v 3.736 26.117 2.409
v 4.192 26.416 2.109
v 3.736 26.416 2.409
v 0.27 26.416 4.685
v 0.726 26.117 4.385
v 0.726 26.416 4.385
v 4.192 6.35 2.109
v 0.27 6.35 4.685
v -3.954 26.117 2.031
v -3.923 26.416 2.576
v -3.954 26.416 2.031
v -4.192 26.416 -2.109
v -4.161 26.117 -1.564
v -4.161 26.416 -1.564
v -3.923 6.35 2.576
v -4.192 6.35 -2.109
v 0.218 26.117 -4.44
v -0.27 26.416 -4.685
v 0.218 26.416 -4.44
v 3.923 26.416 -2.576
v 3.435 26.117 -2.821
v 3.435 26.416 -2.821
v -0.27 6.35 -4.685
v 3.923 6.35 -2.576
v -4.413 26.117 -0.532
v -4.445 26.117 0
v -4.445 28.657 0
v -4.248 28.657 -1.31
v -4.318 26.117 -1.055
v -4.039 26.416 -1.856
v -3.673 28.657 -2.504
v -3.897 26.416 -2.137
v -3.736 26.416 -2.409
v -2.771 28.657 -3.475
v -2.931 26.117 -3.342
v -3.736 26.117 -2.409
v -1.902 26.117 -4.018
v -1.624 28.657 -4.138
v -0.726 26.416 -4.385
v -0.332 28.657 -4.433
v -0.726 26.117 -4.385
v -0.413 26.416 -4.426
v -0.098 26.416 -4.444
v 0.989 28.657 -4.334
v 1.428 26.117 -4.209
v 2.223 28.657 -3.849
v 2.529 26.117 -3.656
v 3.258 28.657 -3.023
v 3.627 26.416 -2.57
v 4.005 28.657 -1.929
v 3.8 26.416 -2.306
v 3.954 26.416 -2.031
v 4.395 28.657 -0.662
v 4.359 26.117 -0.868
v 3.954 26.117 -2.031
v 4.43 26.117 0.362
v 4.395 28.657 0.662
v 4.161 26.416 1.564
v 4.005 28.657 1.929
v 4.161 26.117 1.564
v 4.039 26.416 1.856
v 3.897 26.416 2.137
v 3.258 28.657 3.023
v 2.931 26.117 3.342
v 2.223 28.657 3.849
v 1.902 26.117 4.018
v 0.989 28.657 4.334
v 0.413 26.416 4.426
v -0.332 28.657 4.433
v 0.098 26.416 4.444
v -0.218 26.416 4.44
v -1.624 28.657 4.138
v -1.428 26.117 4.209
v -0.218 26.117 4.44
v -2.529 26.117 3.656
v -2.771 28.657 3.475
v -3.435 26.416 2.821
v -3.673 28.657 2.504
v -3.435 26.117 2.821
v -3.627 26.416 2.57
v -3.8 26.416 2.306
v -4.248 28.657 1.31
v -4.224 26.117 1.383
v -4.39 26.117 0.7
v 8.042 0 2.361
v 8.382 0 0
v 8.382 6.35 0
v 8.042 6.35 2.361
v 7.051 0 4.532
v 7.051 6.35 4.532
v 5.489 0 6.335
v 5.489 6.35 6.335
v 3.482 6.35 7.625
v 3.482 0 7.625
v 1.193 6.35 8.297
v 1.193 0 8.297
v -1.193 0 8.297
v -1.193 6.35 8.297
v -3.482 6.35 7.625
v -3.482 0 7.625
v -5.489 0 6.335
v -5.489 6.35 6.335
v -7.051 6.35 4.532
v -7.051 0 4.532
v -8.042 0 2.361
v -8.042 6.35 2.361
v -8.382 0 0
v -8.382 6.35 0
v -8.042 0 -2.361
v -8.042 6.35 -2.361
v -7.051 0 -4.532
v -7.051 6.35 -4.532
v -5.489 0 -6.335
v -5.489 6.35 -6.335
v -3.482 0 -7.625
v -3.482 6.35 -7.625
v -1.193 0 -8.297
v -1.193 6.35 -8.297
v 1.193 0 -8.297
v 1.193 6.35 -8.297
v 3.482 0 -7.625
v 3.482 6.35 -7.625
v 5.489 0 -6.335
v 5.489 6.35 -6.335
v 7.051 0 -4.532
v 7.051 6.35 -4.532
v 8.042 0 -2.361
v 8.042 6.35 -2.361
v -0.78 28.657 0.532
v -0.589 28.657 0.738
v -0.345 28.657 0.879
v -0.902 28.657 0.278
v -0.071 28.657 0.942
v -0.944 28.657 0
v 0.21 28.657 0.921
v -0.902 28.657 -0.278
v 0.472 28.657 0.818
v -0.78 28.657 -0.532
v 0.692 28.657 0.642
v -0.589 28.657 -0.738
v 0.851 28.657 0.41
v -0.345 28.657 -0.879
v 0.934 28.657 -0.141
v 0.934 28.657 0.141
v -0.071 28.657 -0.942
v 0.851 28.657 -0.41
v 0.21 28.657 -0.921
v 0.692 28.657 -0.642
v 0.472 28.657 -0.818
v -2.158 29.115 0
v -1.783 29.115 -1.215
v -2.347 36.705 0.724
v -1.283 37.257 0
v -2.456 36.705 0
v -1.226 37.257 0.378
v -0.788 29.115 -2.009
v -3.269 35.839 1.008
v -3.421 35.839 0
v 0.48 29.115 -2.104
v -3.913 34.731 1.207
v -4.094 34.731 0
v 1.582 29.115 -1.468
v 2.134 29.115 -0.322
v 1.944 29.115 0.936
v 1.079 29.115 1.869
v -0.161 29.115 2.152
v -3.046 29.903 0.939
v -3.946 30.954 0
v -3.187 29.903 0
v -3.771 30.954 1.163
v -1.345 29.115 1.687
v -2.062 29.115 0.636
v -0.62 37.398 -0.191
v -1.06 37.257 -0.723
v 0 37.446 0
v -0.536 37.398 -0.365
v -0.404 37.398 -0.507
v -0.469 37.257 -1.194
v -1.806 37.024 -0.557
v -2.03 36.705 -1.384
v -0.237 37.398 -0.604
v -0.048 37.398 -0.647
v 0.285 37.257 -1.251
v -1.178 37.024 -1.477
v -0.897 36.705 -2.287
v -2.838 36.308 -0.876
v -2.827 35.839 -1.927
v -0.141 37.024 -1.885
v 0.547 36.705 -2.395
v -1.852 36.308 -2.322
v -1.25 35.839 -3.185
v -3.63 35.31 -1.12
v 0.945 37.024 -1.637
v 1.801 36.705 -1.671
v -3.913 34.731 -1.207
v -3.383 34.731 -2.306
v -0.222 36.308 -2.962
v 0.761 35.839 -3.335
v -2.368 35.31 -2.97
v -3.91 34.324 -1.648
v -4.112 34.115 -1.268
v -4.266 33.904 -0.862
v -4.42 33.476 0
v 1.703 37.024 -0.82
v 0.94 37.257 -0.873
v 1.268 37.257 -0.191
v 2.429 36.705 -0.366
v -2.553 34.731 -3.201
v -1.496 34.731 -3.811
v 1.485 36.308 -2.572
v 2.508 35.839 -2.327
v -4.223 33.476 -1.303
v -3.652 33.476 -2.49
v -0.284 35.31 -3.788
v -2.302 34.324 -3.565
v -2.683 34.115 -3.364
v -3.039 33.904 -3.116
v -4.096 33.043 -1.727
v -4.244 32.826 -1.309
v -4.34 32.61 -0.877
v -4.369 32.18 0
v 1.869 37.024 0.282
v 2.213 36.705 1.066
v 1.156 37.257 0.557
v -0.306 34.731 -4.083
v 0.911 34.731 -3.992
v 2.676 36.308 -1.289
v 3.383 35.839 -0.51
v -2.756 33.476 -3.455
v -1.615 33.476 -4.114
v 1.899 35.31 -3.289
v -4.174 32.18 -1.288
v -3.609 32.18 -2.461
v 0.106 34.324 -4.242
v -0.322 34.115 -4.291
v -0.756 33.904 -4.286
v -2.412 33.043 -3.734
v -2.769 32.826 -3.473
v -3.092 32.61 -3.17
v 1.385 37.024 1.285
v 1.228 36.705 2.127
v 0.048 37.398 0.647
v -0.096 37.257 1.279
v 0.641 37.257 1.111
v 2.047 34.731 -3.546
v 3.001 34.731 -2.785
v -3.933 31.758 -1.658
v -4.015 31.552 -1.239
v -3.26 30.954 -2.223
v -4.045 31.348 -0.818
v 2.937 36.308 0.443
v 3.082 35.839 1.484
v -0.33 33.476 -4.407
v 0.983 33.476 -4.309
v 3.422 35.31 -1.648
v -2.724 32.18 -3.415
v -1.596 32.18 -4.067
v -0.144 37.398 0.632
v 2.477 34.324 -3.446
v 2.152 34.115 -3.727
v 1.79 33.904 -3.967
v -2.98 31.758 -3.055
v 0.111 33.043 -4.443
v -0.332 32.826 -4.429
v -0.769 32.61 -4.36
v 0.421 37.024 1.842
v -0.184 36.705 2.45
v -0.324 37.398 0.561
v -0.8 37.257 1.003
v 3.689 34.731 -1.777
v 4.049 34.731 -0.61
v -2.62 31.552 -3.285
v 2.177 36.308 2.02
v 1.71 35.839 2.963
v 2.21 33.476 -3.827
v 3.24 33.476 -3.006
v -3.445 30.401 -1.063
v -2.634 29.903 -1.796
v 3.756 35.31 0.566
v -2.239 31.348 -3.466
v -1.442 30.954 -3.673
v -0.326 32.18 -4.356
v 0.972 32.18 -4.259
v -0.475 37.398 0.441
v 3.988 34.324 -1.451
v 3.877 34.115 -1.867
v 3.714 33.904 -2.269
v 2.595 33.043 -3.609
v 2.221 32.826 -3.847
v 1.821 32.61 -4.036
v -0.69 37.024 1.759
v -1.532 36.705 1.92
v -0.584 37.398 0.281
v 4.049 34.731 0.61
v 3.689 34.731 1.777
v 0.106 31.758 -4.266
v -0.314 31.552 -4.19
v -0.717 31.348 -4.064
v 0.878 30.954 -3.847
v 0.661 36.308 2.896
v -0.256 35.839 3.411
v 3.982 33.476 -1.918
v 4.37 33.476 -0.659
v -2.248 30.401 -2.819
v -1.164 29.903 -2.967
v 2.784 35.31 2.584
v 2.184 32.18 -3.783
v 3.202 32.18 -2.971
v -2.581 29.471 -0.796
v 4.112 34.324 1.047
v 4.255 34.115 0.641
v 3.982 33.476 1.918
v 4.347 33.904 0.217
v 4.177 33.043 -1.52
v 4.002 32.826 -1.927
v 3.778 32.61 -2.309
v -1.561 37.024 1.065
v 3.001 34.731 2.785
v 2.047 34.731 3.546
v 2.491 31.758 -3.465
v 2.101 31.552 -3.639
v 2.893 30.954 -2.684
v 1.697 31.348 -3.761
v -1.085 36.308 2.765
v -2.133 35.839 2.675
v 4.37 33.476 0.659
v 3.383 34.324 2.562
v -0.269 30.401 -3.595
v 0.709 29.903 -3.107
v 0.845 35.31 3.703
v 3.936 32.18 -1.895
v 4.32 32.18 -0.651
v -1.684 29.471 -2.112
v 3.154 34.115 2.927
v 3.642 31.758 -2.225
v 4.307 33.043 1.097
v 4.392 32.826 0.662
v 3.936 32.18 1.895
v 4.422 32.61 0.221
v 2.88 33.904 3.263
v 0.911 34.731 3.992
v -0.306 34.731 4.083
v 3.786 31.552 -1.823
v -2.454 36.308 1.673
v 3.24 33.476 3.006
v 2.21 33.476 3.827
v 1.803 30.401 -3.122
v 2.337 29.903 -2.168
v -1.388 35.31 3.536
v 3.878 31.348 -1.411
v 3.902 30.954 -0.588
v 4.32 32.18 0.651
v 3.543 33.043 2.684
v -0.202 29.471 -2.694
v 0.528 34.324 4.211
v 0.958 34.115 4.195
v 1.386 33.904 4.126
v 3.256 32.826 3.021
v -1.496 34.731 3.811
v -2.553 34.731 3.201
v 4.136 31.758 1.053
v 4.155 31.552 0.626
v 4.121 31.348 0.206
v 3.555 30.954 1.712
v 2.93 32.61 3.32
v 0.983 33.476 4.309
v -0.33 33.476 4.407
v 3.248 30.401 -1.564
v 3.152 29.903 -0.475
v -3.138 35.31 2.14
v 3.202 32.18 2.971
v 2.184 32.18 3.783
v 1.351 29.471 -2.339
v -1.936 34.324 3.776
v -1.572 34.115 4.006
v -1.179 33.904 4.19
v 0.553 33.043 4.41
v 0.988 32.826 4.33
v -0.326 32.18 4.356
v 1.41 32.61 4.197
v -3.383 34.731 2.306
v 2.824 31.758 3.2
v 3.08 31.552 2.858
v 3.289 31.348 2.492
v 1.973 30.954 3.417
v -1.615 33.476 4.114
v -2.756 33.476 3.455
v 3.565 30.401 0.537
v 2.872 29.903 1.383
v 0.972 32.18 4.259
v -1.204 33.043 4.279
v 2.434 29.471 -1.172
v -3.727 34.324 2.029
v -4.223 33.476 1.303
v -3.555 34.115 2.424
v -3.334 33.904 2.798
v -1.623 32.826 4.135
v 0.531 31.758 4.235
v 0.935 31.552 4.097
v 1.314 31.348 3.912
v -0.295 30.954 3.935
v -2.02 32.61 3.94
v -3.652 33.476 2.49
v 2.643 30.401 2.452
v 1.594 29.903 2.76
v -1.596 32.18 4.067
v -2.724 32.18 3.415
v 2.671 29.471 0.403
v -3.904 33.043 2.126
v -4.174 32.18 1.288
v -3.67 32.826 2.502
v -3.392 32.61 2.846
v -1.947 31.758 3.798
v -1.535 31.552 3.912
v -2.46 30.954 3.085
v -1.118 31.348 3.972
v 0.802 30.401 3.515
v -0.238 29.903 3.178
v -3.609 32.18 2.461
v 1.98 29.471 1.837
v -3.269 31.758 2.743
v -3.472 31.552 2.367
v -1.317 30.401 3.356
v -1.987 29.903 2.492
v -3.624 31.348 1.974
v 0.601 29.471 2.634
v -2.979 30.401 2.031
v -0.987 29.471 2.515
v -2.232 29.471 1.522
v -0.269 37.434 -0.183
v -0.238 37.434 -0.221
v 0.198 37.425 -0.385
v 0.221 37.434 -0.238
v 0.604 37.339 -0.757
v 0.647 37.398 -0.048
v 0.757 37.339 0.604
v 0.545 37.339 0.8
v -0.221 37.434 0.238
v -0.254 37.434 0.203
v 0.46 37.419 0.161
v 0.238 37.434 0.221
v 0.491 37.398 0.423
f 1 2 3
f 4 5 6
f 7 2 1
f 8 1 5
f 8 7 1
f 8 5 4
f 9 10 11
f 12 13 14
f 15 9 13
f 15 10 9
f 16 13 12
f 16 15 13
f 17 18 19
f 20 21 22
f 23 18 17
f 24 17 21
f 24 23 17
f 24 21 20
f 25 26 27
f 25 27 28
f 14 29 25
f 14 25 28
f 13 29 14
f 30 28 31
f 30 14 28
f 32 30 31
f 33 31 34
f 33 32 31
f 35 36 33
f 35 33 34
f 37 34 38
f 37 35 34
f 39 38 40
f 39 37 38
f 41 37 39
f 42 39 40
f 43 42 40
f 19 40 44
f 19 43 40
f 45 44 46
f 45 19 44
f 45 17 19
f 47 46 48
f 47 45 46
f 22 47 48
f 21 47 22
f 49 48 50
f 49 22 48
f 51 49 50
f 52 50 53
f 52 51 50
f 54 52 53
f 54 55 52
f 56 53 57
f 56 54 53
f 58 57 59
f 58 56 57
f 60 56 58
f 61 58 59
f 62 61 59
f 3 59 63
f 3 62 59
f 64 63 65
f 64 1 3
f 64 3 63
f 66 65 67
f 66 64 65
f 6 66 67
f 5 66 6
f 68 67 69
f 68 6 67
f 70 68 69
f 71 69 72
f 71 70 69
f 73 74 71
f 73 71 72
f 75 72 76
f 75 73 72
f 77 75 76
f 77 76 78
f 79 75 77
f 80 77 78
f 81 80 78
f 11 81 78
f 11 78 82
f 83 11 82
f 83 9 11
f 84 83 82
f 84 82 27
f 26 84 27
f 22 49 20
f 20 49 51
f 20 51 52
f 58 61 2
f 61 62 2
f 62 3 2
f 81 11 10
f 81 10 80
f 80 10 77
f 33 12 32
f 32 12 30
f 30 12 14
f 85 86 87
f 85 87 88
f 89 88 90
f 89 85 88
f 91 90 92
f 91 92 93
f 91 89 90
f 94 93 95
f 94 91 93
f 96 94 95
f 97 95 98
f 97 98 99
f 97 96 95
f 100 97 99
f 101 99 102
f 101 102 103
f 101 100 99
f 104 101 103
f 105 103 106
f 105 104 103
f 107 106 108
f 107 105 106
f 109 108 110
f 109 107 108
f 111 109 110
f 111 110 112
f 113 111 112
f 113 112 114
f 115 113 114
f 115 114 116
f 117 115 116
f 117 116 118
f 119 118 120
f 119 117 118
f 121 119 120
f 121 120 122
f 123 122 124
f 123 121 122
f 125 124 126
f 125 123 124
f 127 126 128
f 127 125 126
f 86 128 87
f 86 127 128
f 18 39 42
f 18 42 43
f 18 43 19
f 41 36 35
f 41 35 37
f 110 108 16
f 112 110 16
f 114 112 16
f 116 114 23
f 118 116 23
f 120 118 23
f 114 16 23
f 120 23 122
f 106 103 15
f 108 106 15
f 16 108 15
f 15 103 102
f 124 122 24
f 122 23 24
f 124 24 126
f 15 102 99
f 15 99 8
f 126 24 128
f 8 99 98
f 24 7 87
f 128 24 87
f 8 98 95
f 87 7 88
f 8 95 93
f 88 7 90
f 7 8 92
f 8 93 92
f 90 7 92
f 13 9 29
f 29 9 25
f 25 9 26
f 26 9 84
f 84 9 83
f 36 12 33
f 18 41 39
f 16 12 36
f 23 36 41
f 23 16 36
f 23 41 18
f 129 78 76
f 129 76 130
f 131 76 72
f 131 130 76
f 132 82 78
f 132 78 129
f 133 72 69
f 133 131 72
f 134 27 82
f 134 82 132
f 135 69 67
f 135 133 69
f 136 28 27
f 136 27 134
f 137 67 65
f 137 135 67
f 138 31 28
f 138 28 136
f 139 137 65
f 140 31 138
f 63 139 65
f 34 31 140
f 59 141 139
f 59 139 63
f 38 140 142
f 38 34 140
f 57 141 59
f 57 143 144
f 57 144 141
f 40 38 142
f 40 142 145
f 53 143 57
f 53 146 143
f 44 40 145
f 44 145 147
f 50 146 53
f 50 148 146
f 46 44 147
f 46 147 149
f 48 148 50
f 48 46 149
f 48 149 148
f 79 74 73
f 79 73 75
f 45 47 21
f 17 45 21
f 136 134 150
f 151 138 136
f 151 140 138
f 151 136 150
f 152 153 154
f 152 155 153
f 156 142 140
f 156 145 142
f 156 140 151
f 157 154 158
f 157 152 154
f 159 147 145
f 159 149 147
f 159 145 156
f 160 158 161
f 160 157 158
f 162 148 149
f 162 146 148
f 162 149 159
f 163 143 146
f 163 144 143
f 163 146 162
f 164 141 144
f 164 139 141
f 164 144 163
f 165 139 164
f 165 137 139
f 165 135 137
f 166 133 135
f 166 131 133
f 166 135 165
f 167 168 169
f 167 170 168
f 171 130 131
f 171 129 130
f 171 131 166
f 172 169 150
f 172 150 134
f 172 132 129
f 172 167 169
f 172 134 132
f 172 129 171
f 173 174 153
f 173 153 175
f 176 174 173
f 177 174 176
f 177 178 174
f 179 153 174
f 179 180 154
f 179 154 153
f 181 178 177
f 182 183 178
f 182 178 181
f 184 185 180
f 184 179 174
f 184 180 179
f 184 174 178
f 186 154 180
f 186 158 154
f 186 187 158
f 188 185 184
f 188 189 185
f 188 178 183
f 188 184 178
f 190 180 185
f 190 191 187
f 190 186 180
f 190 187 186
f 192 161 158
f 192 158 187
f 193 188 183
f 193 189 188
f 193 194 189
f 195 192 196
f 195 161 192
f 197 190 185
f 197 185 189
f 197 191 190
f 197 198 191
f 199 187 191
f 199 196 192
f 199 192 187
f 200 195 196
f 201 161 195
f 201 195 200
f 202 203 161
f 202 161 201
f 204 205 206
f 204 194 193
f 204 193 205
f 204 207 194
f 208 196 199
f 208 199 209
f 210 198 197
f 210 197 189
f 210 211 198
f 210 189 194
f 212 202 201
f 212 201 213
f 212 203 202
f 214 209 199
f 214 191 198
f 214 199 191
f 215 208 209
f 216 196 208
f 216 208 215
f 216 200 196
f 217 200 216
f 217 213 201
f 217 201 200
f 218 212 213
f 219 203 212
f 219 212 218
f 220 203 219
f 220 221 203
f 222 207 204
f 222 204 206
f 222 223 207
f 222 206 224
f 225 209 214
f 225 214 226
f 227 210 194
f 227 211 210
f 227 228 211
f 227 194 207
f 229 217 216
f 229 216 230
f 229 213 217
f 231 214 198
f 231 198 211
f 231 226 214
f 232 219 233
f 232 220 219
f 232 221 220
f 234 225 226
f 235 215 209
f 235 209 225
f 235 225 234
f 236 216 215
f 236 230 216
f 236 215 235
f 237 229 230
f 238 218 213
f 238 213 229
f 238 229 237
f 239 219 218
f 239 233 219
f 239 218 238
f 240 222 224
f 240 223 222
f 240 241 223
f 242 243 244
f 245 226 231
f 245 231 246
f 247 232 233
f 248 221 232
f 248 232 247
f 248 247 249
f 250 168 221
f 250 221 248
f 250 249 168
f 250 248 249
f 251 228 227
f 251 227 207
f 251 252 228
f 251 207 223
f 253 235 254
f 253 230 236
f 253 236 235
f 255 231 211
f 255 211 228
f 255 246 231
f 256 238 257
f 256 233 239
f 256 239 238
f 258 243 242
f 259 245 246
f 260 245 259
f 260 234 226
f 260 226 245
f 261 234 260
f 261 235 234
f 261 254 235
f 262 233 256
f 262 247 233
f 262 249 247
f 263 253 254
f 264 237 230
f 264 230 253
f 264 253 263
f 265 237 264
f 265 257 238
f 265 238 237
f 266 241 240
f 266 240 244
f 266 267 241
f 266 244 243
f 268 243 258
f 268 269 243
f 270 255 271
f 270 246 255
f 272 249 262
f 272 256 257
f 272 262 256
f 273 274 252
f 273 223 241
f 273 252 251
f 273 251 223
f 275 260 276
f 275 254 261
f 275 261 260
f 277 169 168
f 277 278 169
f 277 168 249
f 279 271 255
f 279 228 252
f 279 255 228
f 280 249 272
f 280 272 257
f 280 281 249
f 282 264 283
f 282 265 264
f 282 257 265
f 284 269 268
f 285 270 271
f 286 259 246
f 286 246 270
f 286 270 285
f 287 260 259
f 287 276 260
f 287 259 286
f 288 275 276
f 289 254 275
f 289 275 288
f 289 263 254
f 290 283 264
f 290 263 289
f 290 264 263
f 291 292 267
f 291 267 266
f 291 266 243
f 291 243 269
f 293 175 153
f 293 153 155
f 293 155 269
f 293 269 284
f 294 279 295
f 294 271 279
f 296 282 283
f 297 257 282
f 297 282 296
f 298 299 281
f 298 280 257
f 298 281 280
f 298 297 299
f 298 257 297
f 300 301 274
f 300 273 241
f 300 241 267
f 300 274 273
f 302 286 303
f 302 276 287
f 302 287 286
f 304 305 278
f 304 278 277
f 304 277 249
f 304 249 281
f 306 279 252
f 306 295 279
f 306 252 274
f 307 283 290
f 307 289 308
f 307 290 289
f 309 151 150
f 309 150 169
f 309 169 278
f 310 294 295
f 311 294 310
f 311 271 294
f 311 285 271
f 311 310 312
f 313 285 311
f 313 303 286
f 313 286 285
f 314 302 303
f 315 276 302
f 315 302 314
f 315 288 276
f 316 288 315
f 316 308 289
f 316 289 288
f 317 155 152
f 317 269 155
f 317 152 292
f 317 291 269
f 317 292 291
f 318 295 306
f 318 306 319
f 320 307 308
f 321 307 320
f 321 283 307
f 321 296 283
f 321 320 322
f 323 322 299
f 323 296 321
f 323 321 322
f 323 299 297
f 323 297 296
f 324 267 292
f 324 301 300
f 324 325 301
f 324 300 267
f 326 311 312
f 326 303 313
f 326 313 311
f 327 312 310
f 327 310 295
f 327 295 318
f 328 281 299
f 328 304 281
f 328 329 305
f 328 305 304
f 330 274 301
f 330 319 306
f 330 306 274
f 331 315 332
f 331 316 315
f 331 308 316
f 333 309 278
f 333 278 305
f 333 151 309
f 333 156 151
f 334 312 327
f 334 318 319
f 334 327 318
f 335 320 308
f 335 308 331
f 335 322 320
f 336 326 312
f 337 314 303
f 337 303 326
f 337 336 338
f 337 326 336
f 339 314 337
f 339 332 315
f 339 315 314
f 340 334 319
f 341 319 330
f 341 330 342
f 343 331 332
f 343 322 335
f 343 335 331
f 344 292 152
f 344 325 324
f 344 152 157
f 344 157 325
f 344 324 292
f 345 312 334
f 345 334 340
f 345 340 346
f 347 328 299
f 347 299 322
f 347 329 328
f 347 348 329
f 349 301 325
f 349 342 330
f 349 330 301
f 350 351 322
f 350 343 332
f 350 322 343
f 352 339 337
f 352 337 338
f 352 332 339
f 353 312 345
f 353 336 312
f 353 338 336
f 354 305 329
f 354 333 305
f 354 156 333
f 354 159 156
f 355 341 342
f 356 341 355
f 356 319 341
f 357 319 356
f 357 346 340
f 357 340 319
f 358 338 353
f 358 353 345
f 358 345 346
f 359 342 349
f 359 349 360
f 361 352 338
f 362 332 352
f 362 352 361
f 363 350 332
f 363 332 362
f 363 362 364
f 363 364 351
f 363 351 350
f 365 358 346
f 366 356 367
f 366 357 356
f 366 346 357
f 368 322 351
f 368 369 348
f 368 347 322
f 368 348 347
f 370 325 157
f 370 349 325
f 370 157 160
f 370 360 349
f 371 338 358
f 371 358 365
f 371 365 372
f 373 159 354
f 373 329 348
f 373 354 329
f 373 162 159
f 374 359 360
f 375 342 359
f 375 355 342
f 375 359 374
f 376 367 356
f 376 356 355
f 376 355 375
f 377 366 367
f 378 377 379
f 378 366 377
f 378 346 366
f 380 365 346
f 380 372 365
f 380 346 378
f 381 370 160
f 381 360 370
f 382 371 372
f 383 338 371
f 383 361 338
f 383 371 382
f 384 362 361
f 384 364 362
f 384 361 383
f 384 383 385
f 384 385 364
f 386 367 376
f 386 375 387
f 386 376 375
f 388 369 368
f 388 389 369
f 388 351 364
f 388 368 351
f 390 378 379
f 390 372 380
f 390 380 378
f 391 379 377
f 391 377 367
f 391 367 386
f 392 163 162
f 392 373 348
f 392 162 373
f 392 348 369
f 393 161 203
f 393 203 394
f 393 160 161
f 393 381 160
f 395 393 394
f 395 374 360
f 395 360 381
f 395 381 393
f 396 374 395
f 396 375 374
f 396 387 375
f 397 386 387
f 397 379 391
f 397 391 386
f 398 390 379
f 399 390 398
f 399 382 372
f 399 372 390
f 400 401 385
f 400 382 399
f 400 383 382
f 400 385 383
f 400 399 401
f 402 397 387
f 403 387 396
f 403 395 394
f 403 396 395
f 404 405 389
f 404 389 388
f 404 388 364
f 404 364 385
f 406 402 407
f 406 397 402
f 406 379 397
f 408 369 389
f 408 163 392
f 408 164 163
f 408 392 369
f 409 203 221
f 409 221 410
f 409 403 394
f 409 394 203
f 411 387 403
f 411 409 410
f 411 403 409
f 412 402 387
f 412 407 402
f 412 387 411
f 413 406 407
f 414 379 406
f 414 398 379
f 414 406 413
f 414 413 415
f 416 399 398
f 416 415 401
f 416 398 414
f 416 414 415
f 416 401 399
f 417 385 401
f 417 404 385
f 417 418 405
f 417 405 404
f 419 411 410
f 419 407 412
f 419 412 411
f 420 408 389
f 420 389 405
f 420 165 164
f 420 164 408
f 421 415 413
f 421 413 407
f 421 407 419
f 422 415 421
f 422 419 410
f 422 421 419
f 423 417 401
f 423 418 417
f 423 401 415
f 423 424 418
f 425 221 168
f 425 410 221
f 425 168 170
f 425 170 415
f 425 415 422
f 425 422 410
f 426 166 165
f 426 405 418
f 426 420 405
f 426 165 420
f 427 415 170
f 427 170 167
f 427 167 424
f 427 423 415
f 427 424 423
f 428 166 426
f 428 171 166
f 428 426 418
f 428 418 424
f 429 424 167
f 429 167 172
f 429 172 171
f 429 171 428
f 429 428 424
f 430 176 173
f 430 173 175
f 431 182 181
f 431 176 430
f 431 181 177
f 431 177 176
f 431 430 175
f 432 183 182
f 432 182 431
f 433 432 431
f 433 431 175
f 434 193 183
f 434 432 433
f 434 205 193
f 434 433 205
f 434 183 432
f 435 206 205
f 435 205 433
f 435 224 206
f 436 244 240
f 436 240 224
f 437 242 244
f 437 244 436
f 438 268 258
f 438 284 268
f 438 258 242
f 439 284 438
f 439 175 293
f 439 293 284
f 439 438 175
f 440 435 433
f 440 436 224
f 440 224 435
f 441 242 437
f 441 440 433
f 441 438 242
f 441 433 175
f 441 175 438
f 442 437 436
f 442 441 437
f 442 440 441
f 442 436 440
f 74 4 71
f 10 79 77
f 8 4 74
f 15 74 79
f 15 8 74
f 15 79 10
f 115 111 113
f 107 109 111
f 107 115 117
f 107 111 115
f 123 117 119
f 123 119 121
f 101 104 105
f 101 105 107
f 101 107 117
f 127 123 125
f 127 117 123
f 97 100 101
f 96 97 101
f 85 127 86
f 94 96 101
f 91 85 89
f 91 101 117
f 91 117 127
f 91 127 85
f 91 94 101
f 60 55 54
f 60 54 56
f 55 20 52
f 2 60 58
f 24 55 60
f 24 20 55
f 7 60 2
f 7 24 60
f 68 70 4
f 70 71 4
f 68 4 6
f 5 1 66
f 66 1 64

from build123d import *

# Parameters (mm, degrees)
F3_DEPTH = 26.416
F2_R     = 8.382
F4_DEPTH = 6.35


with BuildPart() as f1:
    # F0 (on Top) → F1 (revolve)
    with BuildSketch(Plane.XY):
        with BuildLine():
            Line((0, 28.657248), (0, 37.445775))
            ThreePointArc((0, 37.445775), (-4.419559, 33.475669), (-0.944353, 28.657248))
            Line((-0.944353, 28.657248), (-4.445, 28.657248))
            Line((-4.445, 28.657248), (-4.445, 26.117248))
            Line((-4.445, 26.117248), (0, 26.117248))
            Line((0, 26.117248), (0, 28.555775))
            Line((0, 28.555775), (0, 28.657248))
        make_face()
    revolve(axis=Axis((0, 33.000775, 0), (0, -1, 0)))

    # F2 (on Front) → F3 (join)
    with BuildSketch(Plane.XZ):
        Polygon((-4.192043, -2.109085), (-0.269501, -4.684958), (3.922542, -2.575873), (4.192043, 2.109085), (0.269501, 4.684958), (-3.922542, 2.575873), align=None)
    extrude(amount=-F3_DEPTH)

    # F2 (on Front) → F4 (join)
    with BuildSketch(Plane.XZ):
        Circle(F2_R)
        Polygon((3.922542, -2.575873), (-0.269501, -4.684958), (-4.192043, -2.109085), (-3.922542, 2.575873), (0.269501, 4.684958), (4.192043, 2.109085), align=None, mode=Mode.SUBTRACT)
    extrude(amount=-F4_DEPTH)


solid = f1.part
